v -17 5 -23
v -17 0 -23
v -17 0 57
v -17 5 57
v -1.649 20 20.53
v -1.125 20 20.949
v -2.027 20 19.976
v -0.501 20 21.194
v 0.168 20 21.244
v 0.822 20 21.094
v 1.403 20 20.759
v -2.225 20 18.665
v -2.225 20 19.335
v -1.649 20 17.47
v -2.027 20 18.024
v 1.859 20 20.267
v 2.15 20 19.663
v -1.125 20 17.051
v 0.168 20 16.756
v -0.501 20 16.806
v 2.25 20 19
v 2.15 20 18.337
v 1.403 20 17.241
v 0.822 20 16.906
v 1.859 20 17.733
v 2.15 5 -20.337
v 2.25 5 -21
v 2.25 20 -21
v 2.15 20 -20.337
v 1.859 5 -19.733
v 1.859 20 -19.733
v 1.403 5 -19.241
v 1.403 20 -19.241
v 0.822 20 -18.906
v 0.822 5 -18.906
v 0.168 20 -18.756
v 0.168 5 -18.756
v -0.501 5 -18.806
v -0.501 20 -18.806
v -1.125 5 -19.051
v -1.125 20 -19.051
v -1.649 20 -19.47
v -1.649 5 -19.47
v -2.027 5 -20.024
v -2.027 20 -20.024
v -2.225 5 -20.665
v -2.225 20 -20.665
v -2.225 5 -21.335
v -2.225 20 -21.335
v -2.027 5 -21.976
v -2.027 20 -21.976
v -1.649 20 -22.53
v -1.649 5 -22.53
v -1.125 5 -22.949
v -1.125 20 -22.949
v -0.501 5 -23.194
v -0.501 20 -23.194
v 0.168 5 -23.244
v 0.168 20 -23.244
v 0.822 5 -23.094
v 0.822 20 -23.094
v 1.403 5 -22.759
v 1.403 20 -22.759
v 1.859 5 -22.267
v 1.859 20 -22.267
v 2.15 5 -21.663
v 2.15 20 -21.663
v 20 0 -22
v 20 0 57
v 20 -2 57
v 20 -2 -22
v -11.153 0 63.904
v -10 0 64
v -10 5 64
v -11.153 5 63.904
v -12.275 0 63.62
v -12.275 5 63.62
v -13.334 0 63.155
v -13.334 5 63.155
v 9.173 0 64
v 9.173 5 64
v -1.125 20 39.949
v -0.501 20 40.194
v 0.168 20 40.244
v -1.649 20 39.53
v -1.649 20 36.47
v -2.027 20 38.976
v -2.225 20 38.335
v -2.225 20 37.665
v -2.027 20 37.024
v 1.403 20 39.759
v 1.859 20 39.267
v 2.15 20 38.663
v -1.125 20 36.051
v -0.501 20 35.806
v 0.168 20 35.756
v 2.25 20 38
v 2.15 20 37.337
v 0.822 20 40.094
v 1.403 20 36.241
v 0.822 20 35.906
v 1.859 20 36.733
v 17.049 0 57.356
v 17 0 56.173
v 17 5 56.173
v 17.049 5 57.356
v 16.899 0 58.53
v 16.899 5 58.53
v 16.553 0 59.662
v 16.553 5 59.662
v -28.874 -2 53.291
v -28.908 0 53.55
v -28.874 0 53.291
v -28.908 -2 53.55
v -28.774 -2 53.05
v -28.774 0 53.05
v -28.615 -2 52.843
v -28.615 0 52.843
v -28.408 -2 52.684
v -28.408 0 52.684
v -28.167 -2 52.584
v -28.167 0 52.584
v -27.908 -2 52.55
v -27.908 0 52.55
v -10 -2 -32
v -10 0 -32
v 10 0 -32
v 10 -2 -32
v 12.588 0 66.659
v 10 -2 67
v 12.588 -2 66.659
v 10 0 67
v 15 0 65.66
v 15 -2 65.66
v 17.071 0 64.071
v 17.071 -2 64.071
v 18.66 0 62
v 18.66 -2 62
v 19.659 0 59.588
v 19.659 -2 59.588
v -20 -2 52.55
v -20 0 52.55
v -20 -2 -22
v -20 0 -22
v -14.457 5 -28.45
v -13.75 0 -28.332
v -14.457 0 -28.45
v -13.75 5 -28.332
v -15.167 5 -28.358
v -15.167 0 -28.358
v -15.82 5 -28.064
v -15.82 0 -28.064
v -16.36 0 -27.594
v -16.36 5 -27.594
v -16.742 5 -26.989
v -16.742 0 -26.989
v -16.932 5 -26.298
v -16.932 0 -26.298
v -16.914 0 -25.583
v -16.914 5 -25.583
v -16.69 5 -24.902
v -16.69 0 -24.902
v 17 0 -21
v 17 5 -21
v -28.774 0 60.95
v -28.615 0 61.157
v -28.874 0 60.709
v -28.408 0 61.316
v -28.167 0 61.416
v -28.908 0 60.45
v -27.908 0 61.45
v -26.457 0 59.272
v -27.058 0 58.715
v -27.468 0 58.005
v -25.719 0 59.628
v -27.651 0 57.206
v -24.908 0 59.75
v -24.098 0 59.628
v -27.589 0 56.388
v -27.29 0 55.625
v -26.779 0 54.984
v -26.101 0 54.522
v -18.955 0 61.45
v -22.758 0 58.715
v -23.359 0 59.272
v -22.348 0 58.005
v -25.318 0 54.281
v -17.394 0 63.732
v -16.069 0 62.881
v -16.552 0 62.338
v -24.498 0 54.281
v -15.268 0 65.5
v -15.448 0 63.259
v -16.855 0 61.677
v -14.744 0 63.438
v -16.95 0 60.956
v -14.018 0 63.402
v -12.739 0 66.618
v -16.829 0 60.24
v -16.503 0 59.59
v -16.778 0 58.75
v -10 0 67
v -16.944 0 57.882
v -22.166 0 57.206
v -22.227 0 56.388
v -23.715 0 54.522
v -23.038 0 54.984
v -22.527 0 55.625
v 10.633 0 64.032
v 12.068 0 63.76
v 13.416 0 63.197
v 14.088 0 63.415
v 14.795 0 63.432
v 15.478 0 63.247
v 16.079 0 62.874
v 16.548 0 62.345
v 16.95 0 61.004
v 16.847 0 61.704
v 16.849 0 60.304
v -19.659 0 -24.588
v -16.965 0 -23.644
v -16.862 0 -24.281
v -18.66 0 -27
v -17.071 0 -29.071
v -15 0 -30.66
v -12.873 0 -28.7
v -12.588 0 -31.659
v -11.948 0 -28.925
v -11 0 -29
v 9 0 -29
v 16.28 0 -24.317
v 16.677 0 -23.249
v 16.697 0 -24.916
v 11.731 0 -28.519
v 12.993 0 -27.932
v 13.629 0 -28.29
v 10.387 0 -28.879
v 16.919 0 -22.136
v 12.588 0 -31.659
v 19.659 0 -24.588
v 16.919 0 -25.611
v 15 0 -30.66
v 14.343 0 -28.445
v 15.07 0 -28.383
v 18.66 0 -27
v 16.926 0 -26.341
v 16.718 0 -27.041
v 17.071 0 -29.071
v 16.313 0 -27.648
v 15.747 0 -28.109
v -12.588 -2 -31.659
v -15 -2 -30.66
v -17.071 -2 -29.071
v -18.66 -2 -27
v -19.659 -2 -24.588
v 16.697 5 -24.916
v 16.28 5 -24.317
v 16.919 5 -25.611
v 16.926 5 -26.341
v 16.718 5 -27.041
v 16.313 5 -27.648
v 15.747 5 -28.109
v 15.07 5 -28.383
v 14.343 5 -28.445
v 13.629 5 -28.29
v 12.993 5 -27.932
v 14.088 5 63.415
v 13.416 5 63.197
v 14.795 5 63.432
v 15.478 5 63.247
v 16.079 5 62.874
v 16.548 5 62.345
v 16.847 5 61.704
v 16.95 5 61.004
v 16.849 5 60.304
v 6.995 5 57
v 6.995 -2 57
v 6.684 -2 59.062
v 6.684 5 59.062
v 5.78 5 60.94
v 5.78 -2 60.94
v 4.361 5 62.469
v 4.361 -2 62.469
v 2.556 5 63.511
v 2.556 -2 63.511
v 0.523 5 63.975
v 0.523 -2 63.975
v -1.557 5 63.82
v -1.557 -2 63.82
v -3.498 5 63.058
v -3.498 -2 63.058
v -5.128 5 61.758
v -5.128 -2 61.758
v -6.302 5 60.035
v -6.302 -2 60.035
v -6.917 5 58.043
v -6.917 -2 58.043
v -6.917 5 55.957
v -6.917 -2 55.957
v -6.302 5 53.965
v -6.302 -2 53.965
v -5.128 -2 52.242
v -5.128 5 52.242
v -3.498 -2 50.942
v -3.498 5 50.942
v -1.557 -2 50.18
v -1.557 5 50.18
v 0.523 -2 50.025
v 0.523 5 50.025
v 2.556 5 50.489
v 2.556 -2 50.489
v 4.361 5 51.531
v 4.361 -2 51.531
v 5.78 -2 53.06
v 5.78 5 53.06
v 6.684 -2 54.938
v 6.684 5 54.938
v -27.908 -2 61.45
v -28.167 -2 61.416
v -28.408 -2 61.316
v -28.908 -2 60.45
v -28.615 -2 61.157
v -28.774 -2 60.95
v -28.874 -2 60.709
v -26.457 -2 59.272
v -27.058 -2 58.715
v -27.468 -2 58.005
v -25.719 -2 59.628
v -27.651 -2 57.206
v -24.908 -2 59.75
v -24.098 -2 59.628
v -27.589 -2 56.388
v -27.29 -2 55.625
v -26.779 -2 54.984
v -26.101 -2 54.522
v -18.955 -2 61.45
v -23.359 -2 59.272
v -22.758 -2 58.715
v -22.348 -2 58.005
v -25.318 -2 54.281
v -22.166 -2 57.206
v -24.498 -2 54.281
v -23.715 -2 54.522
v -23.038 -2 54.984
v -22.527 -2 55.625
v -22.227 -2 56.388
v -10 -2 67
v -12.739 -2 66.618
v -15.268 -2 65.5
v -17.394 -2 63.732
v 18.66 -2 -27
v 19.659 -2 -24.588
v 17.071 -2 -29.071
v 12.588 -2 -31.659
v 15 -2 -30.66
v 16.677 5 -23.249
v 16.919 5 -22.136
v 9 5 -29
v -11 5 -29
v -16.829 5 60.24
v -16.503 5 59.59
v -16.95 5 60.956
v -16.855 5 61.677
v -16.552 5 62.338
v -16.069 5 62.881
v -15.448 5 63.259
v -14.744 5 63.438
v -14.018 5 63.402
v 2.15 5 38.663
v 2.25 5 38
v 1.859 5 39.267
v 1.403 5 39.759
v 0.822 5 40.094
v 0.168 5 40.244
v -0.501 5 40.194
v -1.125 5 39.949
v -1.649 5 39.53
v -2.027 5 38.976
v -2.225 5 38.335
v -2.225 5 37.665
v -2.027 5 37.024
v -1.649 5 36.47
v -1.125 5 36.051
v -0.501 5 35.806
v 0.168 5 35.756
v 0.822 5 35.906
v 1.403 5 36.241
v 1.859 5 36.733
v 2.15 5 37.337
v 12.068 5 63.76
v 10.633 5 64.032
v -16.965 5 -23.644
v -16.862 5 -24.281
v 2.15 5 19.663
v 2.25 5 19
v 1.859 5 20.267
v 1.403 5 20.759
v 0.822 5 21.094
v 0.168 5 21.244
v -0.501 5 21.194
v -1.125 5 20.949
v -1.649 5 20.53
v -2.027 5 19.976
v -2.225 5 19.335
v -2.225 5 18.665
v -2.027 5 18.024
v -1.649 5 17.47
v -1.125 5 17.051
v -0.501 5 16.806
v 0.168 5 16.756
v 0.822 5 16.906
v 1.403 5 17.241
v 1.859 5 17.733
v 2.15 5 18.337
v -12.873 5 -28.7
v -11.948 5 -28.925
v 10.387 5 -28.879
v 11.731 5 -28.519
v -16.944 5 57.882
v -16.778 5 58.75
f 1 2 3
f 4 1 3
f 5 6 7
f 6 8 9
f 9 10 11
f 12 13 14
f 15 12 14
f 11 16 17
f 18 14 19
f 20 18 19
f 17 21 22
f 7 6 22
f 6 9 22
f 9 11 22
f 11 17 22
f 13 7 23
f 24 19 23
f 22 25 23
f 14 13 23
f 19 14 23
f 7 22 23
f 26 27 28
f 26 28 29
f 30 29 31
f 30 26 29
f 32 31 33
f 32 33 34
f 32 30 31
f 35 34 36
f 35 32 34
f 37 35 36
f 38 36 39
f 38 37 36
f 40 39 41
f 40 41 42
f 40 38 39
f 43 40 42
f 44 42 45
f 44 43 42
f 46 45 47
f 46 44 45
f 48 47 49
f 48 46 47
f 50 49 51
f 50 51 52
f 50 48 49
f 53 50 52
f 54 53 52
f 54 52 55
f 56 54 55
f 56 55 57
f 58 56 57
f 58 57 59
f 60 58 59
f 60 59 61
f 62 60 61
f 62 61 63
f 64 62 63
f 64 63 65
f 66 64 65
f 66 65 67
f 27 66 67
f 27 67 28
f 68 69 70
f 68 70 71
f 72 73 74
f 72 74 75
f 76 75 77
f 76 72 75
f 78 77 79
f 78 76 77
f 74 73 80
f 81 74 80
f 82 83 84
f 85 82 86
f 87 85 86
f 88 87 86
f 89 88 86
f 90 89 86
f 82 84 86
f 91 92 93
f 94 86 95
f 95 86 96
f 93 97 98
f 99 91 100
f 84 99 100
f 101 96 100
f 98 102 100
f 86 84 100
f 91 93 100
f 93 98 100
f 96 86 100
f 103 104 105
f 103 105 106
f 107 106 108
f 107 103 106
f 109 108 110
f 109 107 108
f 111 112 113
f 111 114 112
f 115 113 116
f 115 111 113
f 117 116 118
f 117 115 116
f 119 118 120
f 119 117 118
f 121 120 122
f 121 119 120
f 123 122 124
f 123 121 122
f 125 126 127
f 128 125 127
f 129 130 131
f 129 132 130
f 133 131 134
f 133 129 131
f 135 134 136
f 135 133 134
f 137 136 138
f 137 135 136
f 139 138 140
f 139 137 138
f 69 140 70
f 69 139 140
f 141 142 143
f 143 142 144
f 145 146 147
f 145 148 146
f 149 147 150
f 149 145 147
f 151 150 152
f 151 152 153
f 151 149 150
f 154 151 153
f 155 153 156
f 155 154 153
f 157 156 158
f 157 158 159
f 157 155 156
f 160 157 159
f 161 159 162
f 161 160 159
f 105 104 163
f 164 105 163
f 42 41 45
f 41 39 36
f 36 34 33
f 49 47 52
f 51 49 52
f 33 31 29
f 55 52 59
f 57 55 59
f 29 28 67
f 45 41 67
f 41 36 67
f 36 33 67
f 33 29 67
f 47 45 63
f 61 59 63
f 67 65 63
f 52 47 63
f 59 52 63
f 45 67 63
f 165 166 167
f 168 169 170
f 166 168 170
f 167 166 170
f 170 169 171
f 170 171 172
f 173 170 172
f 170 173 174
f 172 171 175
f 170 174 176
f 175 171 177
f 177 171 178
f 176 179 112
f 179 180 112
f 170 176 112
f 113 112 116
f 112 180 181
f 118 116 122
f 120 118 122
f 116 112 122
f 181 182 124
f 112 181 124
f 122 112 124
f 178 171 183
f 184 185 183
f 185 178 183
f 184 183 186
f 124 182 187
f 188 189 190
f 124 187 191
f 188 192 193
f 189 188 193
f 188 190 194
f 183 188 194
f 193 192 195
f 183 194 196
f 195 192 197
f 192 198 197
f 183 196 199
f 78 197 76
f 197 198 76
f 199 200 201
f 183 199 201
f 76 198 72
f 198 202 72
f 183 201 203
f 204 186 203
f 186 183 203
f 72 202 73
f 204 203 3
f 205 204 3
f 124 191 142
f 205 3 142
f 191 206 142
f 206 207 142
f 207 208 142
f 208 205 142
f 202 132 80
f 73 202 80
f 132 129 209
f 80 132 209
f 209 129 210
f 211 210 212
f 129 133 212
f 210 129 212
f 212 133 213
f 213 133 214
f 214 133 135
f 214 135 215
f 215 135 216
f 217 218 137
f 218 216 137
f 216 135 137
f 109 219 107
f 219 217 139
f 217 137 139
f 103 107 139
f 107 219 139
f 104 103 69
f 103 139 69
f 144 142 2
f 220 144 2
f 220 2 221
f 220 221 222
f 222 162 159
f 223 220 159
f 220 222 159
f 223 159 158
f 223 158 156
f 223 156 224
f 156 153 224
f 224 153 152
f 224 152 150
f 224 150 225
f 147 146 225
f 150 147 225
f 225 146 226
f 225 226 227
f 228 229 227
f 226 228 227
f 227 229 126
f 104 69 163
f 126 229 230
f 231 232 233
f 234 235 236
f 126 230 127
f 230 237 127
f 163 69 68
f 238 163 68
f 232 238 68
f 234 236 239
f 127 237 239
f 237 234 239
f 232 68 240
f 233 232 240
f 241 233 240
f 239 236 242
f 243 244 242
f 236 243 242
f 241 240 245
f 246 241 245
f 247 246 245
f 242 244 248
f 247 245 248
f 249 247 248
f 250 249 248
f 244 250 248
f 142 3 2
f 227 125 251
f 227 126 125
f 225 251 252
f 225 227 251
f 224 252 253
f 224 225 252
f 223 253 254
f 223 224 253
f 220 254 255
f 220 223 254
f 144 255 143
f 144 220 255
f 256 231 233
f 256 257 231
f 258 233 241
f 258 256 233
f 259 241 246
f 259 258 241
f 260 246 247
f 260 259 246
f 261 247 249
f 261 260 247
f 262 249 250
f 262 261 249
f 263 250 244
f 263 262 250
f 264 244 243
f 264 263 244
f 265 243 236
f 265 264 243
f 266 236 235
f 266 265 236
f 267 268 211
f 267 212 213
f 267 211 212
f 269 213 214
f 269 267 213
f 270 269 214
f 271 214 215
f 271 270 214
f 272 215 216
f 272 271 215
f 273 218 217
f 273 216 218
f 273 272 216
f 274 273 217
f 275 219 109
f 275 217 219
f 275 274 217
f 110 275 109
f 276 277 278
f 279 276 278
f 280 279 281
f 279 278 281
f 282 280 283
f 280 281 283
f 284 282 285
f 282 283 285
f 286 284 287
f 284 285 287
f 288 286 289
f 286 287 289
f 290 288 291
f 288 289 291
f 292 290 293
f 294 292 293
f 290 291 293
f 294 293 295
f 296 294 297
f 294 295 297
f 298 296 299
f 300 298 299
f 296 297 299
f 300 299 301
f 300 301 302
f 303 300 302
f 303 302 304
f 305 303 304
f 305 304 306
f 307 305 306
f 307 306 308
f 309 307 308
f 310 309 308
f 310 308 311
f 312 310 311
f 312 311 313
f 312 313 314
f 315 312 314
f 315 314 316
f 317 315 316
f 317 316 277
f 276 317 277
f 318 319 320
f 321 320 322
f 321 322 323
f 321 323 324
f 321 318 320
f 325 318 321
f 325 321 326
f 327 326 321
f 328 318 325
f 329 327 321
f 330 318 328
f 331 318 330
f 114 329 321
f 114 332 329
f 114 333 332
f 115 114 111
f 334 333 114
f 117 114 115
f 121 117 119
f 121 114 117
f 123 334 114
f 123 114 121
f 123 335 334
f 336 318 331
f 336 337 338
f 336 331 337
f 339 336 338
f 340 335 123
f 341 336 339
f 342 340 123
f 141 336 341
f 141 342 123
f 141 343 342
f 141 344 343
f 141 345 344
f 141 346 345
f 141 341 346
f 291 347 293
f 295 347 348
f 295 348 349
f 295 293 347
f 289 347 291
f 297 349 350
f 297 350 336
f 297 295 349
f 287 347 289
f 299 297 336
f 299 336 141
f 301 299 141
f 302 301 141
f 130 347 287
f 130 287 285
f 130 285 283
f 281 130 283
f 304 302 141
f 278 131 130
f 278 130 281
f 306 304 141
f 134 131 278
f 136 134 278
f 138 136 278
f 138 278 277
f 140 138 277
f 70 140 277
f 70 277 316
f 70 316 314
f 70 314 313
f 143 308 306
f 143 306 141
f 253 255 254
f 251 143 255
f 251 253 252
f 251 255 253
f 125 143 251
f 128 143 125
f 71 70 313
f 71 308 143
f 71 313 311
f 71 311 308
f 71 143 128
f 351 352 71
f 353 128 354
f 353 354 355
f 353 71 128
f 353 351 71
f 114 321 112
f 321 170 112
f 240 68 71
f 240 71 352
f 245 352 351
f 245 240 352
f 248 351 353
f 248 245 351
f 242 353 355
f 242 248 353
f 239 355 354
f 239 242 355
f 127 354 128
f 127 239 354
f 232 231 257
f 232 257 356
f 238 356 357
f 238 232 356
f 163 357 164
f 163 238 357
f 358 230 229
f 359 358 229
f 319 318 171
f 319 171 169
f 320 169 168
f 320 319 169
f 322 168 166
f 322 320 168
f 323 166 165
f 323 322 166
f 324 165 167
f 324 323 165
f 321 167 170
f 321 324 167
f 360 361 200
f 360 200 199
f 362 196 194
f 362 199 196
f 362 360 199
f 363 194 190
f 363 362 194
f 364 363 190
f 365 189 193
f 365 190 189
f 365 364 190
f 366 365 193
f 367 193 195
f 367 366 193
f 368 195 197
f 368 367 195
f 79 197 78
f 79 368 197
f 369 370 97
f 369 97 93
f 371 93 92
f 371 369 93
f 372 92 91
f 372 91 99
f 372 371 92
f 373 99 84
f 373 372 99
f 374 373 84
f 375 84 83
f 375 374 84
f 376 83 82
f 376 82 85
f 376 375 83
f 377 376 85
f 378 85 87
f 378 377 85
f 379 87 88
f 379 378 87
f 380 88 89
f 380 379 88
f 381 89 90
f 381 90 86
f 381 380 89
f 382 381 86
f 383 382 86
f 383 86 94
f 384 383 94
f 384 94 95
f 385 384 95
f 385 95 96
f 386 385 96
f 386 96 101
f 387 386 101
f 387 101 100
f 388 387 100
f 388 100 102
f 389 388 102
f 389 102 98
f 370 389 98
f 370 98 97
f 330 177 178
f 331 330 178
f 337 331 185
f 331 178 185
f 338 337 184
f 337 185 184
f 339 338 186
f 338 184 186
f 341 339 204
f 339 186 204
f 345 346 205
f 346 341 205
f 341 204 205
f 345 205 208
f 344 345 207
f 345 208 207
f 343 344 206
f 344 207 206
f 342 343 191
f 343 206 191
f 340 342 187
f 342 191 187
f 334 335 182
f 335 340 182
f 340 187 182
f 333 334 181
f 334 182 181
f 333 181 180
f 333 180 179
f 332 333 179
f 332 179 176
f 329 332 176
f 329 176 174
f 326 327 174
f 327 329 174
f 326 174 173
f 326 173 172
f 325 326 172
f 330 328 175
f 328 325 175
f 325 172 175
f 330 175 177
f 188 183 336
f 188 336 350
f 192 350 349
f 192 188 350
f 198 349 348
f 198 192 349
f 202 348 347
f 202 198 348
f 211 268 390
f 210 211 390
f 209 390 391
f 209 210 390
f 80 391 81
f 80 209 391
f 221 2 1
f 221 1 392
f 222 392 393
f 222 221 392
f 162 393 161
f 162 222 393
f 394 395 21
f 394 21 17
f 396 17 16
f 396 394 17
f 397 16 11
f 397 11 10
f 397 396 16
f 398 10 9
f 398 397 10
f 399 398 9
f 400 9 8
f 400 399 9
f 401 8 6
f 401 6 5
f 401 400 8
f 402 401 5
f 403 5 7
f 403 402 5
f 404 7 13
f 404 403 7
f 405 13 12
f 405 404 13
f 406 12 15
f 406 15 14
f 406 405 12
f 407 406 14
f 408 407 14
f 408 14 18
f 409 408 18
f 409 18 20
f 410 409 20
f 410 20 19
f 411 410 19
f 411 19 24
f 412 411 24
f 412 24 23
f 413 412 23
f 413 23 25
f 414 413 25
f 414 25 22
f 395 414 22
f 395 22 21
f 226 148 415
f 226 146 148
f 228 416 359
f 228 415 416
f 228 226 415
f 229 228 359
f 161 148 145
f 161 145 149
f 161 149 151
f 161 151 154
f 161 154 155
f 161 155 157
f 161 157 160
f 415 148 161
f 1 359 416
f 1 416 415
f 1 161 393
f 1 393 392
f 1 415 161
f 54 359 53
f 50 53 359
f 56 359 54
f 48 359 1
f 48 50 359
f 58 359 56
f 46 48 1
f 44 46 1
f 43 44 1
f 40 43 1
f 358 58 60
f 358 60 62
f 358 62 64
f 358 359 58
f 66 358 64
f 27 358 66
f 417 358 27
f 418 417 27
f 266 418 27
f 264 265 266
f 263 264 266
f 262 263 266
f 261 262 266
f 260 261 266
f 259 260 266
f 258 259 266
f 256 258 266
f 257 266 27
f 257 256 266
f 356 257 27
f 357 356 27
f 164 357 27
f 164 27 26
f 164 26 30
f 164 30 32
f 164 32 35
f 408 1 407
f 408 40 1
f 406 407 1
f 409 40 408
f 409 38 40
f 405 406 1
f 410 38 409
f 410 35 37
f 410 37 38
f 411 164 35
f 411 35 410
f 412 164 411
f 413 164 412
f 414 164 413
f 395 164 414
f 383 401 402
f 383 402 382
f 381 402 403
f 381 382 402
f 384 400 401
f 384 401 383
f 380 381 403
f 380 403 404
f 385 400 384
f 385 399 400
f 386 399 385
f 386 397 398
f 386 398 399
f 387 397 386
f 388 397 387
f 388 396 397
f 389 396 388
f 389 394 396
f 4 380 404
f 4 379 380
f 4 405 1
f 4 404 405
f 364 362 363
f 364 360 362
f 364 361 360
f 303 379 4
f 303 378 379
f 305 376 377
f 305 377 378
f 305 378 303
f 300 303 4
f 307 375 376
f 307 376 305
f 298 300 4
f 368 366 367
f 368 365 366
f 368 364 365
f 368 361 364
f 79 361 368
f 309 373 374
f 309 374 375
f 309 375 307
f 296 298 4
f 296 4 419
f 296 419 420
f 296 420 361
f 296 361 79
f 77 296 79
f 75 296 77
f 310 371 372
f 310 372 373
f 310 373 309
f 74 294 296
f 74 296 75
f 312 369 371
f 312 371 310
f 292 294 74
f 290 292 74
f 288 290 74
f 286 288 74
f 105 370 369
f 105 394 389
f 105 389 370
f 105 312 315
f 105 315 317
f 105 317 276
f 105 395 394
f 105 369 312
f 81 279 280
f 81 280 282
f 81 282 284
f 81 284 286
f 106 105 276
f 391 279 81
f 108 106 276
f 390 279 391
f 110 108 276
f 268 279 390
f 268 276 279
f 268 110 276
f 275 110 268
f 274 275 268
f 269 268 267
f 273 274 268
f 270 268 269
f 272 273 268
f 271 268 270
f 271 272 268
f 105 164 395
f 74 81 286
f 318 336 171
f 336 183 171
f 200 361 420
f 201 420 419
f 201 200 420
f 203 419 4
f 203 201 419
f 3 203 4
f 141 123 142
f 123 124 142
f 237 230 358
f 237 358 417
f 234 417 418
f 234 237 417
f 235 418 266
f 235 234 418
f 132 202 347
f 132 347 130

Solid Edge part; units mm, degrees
sketch "Sketch1" plane through (0, 0, 0) normal (0, -1, 0) x (1, 0, 0)
  line L0 (-20, 57) -> (-20, -22)
  arc A0 (-20, -22) -> (-10, -32) centre (-10, -22) ccw
  line L1 (-10, -32) -> (10, -32)
  arc A1 (10, -32) -> (20, -22) centre (10, -22) ccw
  line L2 (20, 57) -> (20, -22)
  arc A2 (10, 67) -> (20, 57) centre (10, 57) cw
  line L3 (-10, 67) -> (10, 67)
  arc A3 (-10, 67) -> (-20, 57) centre (-10, 57) ccw
extrude "Protrusion1" add sketch "Sketch1" along normal blind 2
sketch "Sketch2" plane through (0, 0, 0) normal (0, -1, 0) x (1, 0, 0)
  line L0 (17, 56.173) -> (17, -21)
  arc A0 (17, -21) -> (9, -29) centre (9, -21) cw
  line L1 (9, -29) -> (-11, -29)
  arc A1 (-11, -29) -> (-17, -23) centre (-11, -23) cw
  line L2 (-17, -23) -> (-17, 57)
  arc A2 (-17, 57) -> (-10, 64) centre (-10, 57) cw
  line L3 (-10, 64) -> (9.173, 64)
  arc A3 (9.173, 64) -> (17, 56.173) centre (10.0559, 57.0559) cw
extrude "ExtrudedProtrusion_11" add sketch "Sketch2" against normal blind 5
sketch "Sketch3" plane through (0, 0, 0) normal (0, -1, 0) x (1, 0, 0)
  circle A0 centre (0, 19) radius 2.25
  circle A1 centre (0, 38) radius 2.25
  circle A2 centre (0, -21) radius 2.25
  dimension "D1" = 40
  dimension "D2" = 2
  dimension "D3" = 2
  dimension "D4" = 2
  dimension "D5" = 2
  dimension "D6" = 19
  dimension "D7" = 19
  dimension "D8" = 19
  dimension "D9" = 2
  dimension "D10" = 21
  dimension "D11" = 9.99
  dimension "D12" = 4.5
  dimension "D13" = 4.5
  dimension "D14" = 5
  dimension "D15" = 4.5
  dimension "D16" = 10
  dimension "D17" = 10
  dimension "D18" = 10
  dimension "D19" = 99
  dimension "D20" = 67
  dimension "D21" = 20
  dimension "D22" = 20
  dimension "D23" = 20
extrude "ExtrudedProtrusion_12" add sketch "Sketch3" against normal blind 20
sketch "Sketch4" plane through (0.4, 2, 16.9) normal (0, 1, 0) x (0, 0, 1)
  circle A0 centre (-42.9, 14.1) radius 2.45
  circle A1 centre (-42.9, -14.9) radius 2.45
  circle A2 centre (44.1, -14.9) radius 2.45
  circle A3 centre (44.1, 14.1) radius 2.45
  dimension "D1" = 4.9
  dimension "D2" = 4.9
  dimension "D3" = 4.9
  dimension "D4" = 5.5
  dimension "D5" = 6
  dimension "D6" = 6
  dimension "D7" = 5.5
extrude "ExtrudedProtrusion_13" add sketch "Sketch4" along normal blind 3 and the other way blind 4
sketch "Sketch5" plane through (0.4, 0, 16.9) normal (0, -1, 0) x (0, 0, 1)
  circle A0 centre (40.1, 25.3083) radius 2.75
  line L0 (44.55, 29.3083) -> (35.65, 29.3083)
  line L1 (35.65, 29.3083) -> (35.65, 17.4)
  line L2 (35.65, 17.4) -> (44.55, 17.3083)
  line L3 (44.55, 17.3083) -> (44.55, 29.3083)
  dimension "D1" = 8.9
  dimension "D2" = 12
  dimension "D3" = 8
  dimension "D4" = 4.45
  dimension "D5" = 5.5
extrude "ExtrudedProtrusion_18" add sketch "Sketch5" along normal blind 2
sketch "Sketch6" plane through (0, 0, 0) normal (0, -1, 0) x (1, 0, 0)
  circle A0 centre (0, 57) radius 6.995
extrude "ExtrudedCutout_3" cut sketch "Sketch6" along normal mid plane 10
fillet "Round_2" radius 1 2 edges at (-28.9083, -1, 61.45) (-28.9083, -1, 52.55)
